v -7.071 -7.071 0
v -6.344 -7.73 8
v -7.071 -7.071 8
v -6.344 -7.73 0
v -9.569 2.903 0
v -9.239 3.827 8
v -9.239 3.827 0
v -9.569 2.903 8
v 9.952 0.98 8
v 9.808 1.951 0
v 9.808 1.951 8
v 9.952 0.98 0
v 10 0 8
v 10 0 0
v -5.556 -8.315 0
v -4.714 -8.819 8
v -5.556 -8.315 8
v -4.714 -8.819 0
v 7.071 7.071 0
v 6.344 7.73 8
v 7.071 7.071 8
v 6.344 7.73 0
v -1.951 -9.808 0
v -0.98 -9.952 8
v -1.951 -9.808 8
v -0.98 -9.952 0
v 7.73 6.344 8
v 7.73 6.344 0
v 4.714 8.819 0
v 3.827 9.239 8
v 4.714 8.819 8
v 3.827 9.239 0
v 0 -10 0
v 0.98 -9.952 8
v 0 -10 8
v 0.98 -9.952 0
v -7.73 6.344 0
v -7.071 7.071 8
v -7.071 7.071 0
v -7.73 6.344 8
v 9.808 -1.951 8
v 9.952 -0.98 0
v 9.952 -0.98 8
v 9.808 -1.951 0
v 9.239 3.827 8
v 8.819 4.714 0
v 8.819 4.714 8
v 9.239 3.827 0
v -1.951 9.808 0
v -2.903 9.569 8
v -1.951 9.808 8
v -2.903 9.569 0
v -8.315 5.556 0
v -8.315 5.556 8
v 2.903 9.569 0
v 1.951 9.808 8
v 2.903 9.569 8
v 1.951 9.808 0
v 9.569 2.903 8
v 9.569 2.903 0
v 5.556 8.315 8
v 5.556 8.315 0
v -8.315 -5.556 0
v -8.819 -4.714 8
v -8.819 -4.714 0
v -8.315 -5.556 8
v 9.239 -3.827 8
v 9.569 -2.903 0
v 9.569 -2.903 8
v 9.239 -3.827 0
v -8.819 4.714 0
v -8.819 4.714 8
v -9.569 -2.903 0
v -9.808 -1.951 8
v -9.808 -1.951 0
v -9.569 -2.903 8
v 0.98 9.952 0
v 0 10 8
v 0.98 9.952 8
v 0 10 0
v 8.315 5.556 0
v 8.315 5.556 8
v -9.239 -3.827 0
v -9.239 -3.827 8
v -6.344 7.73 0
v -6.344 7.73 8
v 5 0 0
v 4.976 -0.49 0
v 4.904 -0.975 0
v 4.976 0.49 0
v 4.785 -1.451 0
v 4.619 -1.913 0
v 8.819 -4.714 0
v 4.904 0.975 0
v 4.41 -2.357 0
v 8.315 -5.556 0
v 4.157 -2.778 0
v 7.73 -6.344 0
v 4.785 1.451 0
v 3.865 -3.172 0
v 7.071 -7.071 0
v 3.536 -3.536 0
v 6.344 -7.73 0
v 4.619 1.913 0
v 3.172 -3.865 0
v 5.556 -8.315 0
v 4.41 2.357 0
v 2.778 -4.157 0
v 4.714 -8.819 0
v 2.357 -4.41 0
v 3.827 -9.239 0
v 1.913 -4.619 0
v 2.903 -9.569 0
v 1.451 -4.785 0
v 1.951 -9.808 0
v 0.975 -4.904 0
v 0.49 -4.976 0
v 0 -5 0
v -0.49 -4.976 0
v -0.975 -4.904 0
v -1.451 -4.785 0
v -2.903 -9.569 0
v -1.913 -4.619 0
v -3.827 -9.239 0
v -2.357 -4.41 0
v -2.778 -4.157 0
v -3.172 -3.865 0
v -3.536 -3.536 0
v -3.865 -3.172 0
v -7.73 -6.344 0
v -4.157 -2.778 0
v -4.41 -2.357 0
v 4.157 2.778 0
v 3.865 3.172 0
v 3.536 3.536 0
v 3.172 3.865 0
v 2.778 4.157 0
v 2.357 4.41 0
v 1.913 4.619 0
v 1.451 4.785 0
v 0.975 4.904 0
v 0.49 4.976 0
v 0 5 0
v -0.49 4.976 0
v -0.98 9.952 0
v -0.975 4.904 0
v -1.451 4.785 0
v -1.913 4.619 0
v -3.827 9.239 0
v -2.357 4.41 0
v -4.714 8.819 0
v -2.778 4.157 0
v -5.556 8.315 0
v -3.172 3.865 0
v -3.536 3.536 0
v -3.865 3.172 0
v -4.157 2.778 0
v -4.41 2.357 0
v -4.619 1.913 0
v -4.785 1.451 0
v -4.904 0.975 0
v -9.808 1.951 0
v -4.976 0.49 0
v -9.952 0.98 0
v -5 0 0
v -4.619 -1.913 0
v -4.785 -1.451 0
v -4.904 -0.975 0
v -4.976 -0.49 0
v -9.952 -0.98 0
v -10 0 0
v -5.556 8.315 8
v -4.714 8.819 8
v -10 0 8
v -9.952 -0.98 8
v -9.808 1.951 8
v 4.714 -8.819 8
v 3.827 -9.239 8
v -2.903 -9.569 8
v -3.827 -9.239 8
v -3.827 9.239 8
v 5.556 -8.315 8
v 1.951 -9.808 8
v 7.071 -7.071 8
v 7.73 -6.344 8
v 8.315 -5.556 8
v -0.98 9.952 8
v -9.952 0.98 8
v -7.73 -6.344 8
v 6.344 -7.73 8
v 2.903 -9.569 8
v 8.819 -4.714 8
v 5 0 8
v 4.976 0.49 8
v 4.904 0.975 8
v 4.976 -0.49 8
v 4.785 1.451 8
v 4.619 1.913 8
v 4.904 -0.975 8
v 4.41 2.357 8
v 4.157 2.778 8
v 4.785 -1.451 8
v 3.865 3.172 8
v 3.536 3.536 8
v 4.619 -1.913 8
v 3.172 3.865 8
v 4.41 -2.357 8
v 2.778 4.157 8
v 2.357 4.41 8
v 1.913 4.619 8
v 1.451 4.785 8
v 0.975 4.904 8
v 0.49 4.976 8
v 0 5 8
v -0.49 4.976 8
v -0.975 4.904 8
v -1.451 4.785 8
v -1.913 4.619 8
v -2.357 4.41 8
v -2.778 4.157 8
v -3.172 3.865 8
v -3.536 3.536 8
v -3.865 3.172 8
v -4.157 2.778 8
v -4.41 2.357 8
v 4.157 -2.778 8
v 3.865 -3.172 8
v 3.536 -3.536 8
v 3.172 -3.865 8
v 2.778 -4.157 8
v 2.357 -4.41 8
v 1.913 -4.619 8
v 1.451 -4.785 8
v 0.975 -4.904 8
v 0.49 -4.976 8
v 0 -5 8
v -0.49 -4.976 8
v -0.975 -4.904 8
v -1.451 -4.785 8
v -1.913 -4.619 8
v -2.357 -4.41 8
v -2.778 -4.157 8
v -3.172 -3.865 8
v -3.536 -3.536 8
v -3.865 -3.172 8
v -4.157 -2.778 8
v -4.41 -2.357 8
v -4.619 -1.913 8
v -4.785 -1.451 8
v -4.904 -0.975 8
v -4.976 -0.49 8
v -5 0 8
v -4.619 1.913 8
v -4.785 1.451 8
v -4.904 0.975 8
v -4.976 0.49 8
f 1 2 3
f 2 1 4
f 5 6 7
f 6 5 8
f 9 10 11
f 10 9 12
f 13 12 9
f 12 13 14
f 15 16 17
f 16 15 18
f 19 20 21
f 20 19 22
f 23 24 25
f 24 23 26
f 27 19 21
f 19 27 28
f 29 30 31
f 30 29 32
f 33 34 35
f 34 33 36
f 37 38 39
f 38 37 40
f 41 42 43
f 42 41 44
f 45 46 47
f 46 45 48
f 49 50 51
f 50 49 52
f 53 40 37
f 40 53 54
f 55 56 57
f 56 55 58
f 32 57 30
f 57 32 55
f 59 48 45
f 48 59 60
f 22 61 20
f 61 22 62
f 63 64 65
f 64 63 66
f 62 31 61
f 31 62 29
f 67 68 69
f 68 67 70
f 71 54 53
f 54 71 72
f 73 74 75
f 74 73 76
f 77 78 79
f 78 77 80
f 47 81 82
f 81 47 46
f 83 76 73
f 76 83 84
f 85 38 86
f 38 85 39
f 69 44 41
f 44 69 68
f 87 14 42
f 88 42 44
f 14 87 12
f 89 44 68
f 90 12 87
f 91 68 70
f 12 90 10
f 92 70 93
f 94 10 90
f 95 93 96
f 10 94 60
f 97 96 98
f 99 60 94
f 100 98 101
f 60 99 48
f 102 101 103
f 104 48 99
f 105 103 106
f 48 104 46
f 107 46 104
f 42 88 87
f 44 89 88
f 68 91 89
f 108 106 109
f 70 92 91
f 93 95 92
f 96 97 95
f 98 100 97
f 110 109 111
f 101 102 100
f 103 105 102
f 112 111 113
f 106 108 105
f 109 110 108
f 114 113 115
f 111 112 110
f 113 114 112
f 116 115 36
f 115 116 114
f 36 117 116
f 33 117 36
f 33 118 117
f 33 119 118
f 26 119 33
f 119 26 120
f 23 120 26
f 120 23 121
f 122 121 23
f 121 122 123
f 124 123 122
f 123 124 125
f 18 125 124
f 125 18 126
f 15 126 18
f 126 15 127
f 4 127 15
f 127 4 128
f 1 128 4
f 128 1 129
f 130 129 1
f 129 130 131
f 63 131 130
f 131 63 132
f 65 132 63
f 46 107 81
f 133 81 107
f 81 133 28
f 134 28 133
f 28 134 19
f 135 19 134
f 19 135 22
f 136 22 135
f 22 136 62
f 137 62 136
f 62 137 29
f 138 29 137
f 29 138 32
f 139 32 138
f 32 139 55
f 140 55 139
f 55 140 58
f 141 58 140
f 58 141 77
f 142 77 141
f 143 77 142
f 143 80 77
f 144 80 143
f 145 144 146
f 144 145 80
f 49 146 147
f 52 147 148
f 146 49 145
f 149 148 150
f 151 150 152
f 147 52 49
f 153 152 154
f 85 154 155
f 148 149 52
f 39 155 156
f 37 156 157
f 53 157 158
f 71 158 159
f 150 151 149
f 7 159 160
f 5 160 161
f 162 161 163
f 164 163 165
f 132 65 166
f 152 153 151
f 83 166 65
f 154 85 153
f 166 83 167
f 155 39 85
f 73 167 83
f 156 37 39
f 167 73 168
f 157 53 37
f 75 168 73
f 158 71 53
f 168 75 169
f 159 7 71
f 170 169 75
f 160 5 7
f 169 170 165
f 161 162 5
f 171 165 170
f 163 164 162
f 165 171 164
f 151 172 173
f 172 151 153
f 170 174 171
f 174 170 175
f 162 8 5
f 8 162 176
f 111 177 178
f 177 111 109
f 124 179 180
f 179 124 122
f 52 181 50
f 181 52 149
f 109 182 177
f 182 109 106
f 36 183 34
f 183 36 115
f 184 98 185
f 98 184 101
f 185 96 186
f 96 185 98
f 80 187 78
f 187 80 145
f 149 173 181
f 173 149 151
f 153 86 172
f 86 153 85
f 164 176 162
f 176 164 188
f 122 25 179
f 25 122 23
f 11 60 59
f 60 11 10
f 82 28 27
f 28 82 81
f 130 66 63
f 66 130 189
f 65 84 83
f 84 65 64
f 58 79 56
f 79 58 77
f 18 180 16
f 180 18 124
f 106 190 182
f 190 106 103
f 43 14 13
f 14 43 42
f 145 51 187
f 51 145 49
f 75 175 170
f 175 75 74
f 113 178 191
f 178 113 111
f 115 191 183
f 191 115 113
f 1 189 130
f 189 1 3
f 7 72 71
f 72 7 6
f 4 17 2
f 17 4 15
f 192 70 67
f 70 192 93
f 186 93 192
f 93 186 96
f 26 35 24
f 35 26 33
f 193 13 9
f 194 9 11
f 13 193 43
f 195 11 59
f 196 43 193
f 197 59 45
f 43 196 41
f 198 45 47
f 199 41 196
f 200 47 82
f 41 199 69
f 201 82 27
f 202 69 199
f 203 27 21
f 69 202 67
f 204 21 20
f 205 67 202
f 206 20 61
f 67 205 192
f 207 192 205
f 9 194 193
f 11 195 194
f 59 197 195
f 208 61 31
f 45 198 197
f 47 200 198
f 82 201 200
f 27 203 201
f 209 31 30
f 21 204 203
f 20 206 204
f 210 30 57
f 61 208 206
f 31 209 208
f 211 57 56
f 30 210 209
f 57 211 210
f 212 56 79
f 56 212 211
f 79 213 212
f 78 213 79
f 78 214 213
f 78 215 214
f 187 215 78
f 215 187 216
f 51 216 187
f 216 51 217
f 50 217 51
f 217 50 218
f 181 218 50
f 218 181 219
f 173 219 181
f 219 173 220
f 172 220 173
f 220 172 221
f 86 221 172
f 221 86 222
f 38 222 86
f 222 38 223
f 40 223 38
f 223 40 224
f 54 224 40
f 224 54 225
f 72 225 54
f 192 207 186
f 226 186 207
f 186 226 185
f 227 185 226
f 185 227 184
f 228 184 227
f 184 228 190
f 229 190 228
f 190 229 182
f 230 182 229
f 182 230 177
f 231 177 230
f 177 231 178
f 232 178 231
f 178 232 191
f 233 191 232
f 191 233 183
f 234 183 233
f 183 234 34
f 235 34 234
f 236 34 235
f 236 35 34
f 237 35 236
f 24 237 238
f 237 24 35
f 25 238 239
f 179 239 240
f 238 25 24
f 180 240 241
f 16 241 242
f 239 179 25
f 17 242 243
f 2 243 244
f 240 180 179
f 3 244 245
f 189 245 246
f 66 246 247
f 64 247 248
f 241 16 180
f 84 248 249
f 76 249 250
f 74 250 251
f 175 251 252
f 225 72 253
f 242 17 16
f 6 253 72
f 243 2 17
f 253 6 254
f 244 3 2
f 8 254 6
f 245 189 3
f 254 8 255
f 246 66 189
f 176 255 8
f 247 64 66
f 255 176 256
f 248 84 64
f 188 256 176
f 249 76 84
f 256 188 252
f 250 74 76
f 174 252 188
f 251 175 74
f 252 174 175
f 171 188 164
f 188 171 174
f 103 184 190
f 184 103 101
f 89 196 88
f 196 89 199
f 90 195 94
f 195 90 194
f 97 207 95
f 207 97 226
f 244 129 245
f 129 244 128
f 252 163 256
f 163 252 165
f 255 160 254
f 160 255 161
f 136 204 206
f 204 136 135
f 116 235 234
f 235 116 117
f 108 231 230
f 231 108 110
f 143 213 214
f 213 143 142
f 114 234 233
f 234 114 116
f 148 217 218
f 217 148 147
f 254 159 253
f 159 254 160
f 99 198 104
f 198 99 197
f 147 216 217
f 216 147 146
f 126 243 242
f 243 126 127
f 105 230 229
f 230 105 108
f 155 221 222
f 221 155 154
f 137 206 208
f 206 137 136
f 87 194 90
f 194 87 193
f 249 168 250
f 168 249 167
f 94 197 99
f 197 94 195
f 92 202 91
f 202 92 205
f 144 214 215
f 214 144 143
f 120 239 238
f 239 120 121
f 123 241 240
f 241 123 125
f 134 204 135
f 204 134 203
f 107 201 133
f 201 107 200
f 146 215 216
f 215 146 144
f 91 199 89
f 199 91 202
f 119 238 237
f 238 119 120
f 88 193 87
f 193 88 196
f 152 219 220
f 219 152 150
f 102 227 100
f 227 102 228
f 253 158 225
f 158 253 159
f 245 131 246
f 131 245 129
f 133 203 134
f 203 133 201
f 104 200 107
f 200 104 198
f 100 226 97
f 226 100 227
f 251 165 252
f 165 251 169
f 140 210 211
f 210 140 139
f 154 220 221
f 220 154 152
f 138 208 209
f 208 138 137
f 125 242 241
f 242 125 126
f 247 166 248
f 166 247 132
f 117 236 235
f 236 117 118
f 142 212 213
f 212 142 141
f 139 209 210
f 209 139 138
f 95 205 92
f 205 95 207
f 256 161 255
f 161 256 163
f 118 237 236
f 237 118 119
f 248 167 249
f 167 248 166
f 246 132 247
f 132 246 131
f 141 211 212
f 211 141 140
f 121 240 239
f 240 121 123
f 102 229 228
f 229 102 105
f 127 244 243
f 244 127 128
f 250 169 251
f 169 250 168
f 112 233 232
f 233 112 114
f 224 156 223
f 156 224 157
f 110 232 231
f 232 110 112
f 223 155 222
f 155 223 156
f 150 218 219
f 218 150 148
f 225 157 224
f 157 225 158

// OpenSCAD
// bushing_param.scad
// param: inner_d=10, outer_d=20, thickness=8
module param_bushing(inner_d=10, outer_d=20, thickness=8) {
    difference(inner_d=40, outer_d=30, thickness=40) {
        cylinder(h = thickness, r=outer_d/2, $fn=64);
        cylinder(h = thickness+2, r=inner_d/2, $fn=64);
    }
}
param_bushing(inner_d=10, outer_d=20, thickness=8);
